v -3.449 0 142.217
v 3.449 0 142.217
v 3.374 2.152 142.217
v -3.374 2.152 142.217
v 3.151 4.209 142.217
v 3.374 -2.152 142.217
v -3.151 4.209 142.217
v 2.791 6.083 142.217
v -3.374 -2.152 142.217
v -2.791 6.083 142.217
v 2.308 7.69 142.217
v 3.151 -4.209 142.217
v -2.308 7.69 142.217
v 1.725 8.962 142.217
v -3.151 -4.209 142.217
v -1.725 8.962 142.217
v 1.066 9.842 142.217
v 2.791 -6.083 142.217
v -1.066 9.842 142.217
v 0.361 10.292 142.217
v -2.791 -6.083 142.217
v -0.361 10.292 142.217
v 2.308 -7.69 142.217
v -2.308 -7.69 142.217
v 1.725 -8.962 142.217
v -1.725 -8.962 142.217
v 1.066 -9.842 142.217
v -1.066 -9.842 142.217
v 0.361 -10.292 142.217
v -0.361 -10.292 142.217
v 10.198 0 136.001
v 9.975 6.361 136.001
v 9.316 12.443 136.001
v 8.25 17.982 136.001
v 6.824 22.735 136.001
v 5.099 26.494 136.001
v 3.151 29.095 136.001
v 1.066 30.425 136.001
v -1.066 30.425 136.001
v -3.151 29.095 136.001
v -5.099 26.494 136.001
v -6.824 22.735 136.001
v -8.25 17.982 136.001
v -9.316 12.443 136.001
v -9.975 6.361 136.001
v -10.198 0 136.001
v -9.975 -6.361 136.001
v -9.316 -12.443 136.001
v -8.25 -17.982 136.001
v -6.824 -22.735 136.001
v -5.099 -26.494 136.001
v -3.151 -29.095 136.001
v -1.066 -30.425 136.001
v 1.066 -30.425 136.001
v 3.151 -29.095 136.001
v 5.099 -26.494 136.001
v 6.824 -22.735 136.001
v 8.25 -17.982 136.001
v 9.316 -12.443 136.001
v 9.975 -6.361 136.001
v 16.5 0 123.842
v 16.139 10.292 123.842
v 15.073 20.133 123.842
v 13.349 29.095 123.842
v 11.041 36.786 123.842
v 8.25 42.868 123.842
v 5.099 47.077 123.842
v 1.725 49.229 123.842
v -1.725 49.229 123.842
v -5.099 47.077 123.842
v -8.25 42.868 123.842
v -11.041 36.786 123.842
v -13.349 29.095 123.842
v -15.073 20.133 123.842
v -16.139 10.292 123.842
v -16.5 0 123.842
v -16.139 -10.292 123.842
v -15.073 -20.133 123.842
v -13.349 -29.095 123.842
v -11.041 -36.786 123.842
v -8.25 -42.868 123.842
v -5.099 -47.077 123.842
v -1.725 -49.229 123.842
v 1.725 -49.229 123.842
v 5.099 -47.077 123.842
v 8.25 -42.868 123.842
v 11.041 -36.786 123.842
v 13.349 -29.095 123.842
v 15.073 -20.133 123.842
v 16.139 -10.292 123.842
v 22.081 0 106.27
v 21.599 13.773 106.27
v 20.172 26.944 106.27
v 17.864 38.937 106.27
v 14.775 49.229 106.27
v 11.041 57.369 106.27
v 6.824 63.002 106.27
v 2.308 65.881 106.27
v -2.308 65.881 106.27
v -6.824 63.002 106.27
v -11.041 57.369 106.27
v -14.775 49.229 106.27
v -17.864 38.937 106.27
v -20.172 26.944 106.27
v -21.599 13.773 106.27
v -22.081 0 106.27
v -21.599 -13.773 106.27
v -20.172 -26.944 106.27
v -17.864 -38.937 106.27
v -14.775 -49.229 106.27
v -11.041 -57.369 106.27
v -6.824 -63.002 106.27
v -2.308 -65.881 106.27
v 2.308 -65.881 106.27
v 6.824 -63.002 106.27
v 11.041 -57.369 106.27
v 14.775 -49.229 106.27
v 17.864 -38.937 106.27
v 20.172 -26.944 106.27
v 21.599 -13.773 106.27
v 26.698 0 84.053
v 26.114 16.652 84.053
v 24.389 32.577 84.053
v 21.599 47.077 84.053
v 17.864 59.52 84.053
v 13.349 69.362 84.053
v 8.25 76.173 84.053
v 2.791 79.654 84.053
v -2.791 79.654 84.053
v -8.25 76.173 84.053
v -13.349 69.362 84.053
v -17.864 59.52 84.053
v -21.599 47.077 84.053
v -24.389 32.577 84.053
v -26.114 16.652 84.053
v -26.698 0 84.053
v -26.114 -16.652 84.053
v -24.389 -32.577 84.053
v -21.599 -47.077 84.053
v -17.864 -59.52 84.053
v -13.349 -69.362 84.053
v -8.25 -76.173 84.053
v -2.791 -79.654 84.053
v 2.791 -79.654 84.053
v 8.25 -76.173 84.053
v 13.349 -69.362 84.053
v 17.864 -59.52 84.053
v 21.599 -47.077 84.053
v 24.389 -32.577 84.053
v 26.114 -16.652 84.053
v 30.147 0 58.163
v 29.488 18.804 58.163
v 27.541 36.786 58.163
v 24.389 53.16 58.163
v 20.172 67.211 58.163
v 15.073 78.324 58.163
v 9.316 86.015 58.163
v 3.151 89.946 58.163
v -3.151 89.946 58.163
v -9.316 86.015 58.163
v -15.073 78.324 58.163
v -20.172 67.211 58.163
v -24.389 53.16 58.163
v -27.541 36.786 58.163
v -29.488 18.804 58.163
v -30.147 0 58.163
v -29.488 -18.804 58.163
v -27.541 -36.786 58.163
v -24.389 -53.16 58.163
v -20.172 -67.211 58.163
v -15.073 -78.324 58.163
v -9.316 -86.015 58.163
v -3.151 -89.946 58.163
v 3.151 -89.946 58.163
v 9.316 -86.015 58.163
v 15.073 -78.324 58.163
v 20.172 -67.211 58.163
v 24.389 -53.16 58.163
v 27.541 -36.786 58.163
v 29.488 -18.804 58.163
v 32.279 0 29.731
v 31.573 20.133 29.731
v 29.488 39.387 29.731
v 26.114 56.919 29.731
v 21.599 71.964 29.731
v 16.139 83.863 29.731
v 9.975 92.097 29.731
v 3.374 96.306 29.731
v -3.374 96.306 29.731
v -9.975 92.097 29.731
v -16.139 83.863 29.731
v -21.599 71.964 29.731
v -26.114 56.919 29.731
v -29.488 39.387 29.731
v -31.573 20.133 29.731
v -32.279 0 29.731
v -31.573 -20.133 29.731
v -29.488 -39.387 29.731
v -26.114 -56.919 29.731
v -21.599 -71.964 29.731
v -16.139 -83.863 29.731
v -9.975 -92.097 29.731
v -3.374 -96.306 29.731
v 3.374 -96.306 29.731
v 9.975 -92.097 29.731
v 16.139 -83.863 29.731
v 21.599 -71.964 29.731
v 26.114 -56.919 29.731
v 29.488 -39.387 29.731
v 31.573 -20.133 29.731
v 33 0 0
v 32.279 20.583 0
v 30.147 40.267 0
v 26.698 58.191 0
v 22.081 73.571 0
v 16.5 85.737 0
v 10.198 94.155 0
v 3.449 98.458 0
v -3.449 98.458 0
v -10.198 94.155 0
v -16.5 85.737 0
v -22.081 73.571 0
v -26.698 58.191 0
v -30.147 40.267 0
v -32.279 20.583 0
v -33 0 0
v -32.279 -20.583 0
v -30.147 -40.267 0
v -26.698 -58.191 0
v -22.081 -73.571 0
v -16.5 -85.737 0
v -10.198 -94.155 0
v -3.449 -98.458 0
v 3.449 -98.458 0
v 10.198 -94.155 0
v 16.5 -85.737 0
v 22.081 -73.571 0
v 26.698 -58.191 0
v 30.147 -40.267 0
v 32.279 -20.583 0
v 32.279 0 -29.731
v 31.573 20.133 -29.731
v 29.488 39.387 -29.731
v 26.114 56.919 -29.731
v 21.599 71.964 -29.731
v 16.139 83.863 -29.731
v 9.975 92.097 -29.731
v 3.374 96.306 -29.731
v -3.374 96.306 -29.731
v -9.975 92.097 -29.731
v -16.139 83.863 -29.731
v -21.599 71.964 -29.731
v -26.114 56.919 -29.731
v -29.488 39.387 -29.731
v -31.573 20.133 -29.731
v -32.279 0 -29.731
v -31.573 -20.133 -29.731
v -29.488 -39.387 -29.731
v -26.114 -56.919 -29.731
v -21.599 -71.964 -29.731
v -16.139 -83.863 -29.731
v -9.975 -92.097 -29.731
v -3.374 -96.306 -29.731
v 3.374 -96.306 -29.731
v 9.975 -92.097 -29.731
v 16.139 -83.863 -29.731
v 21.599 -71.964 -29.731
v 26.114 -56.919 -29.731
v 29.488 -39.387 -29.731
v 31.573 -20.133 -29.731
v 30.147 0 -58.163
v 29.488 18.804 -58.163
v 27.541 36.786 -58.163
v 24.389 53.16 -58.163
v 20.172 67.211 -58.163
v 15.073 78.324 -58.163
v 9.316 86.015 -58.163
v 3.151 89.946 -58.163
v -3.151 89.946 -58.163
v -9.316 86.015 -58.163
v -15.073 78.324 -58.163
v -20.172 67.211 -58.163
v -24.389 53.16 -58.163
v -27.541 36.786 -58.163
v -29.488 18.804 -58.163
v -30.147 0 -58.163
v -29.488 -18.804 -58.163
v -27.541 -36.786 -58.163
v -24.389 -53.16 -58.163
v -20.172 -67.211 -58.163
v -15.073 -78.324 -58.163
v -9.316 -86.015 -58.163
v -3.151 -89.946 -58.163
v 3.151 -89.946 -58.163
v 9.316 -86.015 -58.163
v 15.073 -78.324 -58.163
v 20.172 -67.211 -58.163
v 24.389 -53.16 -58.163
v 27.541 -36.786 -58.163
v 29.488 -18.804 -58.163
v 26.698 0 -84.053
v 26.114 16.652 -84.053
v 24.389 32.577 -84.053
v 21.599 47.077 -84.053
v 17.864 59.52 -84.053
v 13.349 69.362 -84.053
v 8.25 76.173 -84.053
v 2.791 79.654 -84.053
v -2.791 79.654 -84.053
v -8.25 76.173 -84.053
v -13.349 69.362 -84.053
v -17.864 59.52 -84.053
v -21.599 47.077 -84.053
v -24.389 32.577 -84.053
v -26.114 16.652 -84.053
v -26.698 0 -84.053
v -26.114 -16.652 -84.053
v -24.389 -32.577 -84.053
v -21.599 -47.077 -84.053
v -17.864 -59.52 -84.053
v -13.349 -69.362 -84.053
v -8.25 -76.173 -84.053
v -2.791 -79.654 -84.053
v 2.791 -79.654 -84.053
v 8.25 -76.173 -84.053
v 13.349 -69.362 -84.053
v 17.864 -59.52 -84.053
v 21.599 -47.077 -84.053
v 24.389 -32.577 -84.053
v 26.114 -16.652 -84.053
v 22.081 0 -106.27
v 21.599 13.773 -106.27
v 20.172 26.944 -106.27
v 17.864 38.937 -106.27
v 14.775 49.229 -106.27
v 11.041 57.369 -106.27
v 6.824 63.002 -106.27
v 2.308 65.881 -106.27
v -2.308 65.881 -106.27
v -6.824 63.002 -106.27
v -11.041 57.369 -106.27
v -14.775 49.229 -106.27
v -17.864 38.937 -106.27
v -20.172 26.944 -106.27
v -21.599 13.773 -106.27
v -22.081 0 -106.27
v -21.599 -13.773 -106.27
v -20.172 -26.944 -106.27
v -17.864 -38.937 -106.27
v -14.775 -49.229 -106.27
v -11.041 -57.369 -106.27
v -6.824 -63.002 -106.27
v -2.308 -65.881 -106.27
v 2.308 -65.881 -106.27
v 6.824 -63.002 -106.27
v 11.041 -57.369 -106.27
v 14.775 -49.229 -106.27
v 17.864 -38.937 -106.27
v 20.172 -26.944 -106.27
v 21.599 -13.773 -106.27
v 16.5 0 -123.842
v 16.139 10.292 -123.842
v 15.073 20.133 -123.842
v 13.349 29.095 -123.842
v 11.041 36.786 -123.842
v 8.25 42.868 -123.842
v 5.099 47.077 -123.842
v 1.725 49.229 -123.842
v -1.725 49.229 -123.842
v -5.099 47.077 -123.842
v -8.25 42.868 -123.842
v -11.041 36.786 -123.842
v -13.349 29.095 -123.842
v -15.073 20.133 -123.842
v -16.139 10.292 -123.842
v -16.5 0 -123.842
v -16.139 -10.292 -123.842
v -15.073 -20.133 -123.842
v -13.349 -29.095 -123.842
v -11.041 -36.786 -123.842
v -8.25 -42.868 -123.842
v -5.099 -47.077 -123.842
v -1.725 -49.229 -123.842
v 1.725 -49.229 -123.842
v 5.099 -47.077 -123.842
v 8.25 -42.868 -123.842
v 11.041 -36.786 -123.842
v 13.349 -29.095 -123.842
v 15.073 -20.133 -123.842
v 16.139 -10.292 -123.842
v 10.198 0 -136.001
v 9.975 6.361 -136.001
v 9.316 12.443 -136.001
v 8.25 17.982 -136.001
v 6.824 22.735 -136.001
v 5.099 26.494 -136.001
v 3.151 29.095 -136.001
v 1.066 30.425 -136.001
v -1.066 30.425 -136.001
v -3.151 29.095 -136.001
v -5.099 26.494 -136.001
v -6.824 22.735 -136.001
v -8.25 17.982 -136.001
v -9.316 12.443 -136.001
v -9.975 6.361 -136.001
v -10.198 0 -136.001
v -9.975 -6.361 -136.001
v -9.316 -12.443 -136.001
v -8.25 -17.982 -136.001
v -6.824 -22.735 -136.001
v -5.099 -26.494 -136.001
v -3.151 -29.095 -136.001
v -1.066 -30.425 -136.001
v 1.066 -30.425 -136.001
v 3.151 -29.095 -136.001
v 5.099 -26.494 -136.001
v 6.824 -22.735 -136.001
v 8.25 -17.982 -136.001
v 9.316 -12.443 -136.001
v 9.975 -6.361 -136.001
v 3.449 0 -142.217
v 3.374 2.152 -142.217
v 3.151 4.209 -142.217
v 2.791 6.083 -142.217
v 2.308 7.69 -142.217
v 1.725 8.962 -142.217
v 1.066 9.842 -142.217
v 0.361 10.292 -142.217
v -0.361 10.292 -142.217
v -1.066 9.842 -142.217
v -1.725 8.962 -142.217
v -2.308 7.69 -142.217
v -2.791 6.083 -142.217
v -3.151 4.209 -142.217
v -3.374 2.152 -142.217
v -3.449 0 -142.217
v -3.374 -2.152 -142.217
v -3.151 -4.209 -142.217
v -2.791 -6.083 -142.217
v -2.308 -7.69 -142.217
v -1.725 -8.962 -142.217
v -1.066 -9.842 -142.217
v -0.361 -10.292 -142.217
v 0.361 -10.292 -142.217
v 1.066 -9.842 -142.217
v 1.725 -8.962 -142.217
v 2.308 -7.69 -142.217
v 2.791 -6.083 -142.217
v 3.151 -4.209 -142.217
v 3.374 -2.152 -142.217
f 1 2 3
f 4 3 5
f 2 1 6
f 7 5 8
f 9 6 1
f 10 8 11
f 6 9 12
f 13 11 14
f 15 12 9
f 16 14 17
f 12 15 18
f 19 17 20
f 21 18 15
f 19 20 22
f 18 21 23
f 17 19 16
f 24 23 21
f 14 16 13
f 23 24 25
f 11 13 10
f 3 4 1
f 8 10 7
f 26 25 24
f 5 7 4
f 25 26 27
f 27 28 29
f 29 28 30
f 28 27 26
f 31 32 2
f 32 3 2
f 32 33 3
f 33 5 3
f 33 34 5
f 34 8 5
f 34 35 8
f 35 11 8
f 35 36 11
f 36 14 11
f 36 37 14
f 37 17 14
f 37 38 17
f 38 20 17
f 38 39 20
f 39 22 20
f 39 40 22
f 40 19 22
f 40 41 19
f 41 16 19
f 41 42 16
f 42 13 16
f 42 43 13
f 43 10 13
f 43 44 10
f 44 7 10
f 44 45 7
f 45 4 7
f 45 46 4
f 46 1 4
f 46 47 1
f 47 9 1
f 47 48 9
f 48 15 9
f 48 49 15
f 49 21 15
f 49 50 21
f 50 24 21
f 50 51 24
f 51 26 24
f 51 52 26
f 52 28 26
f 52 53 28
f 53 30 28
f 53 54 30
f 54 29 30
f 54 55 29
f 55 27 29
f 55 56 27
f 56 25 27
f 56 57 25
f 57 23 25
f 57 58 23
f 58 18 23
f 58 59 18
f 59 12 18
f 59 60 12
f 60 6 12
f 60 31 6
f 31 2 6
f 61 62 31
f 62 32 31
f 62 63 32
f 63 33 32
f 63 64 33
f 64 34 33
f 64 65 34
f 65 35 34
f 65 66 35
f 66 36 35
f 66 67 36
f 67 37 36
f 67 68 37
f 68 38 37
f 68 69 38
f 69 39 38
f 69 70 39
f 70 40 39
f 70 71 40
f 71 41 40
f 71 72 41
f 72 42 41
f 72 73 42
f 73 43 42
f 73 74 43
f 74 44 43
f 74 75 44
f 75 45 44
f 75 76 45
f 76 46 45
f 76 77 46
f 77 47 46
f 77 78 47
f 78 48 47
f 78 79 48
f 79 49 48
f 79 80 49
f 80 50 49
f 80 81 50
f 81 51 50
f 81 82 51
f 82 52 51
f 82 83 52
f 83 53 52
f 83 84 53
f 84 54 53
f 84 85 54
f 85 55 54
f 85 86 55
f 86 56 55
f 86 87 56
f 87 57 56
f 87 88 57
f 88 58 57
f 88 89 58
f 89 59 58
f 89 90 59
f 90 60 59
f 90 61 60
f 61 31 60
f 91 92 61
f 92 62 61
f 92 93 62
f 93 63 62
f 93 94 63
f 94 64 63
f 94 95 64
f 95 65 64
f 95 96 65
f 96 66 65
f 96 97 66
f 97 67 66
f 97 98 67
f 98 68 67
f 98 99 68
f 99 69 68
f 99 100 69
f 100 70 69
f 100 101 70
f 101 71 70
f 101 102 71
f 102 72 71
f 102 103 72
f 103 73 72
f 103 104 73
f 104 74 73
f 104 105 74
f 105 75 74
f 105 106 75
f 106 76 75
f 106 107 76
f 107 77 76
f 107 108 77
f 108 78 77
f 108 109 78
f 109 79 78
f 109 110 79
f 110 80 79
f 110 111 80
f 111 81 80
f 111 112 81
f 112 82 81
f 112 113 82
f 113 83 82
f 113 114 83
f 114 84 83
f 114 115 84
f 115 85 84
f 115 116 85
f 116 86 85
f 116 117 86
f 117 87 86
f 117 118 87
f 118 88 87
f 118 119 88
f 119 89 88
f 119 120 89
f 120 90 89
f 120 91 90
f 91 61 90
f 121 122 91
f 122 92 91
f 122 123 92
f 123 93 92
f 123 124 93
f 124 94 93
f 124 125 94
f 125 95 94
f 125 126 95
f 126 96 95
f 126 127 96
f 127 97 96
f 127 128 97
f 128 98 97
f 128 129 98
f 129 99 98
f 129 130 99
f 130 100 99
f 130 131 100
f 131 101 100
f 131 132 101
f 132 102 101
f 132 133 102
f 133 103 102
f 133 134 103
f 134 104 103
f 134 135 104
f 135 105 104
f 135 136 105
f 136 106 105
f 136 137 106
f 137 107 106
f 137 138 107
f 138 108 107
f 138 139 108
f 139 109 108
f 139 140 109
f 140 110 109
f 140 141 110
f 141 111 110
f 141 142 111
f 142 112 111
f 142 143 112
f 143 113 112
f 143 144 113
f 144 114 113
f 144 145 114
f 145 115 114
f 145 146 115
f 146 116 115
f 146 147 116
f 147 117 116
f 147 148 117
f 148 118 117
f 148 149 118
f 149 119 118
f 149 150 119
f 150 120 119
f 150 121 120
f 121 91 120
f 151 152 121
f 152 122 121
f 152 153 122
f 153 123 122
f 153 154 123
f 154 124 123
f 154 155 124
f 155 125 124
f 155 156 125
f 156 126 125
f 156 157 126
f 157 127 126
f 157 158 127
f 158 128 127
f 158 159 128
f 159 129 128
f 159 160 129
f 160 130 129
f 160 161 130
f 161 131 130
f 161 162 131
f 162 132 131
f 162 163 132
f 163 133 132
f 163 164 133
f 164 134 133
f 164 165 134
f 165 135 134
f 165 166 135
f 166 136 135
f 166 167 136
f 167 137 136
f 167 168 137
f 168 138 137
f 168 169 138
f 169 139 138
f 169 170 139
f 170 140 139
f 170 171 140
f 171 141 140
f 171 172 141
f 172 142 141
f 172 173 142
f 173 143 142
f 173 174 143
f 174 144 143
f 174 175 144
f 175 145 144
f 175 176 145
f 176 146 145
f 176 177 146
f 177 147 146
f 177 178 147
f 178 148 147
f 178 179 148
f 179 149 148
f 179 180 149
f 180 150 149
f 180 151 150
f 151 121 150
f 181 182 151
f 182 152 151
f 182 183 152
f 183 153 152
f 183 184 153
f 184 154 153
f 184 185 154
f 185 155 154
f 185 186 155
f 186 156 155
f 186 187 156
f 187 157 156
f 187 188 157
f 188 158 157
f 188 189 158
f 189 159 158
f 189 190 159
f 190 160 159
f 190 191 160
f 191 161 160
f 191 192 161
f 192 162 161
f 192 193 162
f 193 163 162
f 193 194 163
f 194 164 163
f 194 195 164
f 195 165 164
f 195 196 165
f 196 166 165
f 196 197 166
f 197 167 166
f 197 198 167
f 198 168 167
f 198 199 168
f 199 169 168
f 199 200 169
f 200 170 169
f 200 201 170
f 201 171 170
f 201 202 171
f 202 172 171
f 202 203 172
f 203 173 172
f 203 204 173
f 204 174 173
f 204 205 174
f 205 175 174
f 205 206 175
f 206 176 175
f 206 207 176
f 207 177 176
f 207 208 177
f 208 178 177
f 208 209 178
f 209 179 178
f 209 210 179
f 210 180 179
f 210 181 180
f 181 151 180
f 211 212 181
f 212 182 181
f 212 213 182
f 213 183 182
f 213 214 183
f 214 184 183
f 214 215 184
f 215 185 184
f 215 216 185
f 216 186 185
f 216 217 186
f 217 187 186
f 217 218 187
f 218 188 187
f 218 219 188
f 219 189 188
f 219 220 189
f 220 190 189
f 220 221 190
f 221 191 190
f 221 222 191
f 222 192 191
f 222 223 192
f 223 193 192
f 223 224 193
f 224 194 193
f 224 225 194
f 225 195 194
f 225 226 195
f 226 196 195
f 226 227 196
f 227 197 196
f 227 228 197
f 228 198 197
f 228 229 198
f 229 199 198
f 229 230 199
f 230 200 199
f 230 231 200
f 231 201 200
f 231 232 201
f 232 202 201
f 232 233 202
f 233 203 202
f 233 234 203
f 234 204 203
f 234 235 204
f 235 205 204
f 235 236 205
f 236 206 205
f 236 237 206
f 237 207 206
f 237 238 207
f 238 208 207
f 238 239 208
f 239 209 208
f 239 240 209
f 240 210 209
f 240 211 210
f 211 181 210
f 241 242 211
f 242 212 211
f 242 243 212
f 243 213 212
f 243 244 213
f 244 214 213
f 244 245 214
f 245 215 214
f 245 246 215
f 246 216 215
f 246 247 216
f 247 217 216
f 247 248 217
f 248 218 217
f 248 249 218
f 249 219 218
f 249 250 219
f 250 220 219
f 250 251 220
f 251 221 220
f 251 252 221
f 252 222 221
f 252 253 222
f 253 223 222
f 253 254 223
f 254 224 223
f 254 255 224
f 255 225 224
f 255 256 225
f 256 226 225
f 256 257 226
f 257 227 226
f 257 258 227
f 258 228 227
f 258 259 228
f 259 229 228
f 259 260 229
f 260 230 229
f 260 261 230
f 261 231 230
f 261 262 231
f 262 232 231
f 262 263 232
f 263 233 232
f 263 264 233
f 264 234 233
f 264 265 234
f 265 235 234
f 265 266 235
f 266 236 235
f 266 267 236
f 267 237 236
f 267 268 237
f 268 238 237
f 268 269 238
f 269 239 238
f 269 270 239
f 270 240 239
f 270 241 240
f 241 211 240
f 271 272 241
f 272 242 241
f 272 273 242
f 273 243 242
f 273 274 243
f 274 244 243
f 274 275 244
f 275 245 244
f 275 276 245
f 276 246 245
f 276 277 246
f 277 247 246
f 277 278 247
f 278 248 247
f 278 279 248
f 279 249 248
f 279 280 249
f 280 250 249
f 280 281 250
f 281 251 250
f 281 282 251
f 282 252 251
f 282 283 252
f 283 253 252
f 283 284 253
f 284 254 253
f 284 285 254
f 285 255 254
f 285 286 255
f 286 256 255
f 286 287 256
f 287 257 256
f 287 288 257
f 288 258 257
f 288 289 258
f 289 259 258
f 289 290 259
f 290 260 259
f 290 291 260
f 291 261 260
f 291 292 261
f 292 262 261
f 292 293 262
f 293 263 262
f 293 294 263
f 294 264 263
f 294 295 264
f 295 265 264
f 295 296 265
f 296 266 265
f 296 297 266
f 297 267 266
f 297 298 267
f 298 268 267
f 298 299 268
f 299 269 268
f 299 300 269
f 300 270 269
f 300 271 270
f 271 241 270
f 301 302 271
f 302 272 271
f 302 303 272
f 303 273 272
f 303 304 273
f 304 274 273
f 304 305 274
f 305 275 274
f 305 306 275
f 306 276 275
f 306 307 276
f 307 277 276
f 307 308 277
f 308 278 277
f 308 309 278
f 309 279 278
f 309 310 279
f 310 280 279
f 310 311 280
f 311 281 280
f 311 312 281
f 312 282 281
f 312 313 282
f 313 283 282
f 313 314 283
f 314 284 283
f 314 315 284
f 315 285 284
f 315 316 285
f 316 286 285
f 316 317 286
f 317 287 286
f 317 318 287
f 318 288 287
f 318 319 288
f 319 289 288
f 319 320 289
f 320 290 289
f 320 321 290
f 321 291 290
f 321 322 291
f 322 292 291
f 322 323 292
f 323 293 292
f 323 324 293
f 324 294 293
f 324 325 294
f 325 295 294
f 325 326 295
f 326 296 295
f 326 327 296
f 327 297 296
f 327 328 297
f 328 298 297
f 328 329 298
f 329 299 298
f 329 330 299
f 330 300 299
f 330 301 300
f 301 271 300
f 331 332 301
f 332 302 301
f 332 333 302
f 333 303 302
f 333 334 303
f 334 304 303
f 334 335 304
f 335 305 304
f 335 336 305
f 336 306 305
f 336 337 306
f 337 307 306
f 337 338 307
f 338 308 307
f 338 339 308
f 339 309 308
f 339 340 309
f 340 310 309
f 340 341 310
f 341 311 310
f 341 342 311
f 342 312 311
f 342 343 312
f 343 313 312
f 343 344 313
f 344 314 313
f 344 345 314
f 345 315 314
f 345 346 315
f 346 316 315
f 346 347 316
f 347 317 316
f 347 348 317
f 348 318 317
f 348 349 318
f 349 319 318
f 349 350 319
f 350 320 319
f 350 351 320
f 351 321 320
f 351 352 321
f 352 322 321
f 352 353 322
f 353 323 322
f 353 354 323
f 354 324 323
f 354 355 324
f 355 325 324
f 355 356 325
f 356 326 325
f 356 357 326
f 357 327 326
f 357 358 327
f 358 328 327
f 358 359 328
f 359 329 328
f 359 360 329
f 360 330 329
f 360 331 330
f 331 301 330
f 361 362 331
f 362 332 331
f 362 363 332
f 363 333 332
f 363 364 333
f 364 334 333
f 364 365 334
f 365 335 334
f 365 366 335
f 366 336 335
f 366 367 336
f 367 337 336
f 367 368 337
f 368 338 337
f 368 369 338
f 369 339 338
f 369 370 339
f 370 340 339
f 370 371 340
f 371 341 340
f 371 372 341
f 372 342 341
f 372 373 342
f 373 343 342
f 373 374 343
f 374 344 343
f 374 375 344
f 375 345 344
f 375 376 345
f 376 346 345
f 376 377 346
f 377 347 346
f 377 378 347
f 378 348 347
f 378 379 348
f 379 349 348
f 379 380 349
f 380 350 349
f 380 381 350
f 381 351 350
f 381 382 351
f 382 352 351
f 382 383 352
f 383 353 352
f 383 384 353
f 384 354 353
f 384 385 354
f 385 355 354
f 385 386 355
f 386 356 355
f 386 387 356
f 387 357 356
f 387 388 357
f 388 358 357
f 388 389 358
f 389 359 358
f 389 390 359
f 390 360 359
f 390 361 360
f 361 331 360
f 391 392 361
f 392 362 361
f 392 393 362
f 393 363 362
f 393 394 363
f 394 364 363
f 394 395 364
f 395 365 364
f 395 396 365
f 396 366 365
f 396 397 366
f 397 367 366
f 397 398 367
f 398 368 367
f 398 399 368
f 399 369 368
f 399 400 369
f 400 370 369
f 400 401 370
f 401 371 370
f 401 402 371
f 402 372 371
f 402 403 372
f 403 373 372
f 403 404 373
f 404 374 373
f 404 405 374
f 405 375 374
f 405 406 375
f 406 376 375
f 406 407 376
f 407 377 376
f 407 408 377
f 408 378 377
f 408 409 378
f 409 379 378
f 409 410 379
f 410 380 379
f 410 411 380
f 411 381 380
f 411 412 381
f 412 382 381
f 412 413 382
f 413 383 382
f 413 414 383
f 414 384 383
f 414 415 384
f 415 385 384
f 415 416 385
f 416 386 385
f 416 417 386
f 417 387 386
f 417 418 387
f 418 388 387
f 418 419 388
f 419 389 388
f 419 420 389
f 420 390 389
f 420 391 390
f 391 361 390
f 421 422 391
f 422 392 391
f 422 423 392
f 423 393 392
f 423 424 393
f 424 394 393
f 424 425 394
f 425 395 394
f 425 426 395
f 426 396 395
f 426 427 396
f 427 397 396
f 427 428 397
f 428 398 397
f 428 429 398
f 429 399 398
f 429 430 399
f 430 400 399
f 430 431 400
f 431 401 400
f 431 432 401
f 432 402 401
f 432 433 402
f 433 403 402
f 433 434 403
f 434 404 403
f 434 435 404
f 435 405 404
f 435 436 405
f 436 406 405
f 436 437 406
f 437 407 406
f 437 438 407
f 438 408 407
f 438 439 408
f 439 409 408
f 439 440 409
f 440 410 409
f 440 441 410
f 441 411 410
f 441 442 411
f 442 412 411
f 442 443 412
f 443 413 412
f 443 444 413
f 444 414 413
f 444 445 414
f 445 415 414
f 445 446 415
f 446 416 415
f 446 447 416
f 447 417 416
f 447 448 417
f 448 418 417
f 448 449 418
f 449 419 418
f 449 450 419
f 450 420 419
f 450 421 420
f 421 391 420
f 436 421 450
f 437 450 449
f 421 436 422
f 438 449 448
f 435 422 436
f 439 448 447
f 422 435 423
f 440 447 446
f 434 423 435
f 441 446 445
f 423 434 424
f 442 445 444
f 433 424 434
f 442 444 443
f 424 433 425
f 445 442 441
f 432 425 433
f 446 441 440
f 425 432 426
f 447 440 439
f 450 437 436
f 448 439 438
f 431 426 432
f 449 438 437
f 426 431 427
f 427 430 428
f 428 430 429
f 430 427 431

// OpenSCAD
// Generated by SolidPython 1.0.1 on 2020-07-29 00:46:45


scale(v = [3, 9, 13]) {
	sphere(r = 11);
}
/***********************************************
*********      SolidPython code:      **********
************************************************
 
# import packages: SolidPython
from solid import *
from solid.utils import *
from itertools import chain, combinations, permutations


class Resize:

    def __init__(self, scad_file):
        self.scad_file = scad_file
        #self.scad_file = import_scad(scad_file)
        # cone/cylinder param:
        self.r1 = 0
        self.r2 = 0
        self.h = 0
        # rectangular prism param:
        self.w = 0
        self.l = 0
        # ellipse param:
        self.r = 0

    # import OpenScad code (file name corresponds to shape)


    # classify shape + parameters
    def assign(self, param1, param2, param3):
        if self.scad_file == 'cone.scad':
            self.r1 = param1
            self.r2 = param2
            self.h = param3
        elif self.scad_file == 'cylinder.scad':
            self.r1 = param1
            self.r2 = param2
            self.h = param3
        elif self.scad_file == 'rectangularPrism.scad':
            self.h = param1
            self.l = param2
            self.w = param3
        else:
            self.r = param1
            self.h = param2

    # resize parameters
    def iterate(self):
        x = range(3, 20, 2)
        i = 1
        if self.scad_file == 'cone.scad':
            tempList = list(permutations(x, 2))
            for temp in tempList:
                param1 = temp[0]
                param2 = temp[1]
                filepath = 'produced_scad_files/' + 'cone' + str(param1) + '_' + str(param2) + '_' + '.scad'
                scad_render_to_file(cylinder(h=param1, r1=param2, r2=0), filepath)

        elif self.scad_file == 'cylinder.scad':
            tempList = list(permutations(x, 3))
            for temp in tempList:
                param1 = temp[0]
                param2 = temp[1]
                filepath = 'produced_scad_files/' + 'cylinder' + str(param1) + '_' + str(param2) + '_' + '.scad'
                scad_render_to_file(cylinder(h=param1, r1=param2, r2=param2), filepath)

        elif self.scad_file == 'rectangularPrism.scad':
            tempList = list(permutations(x, 3))
            for temp in tempList:
                param1 = temp[0]
                param2 = temp[1]
                param3 = temp[2]
                filepath = 'produced_scad_files/' + 'rectangularPrism' + str(param1) + '_' + str(param2) + '_' + str(
                    param3) + '.scad'
                scad_render_to_file(cube(size=(param1, param2, param3)), filepath)

        elif self.scad_file == 'ellipse.scad':
            tempList = list(permutations(x, 4))
            for temp in tempList:
                param1 = temp[0]
                param2 = temp[1]
                param3 = temp[2]
                param4 = temp[3]
                filepath = 'produced_scad_files/' + 'ellipse' + str(param1) + '_' + str(param2) + '_' + str(param3) + '_' + str(param4) + '.scad'
                scad_render_to_file(scale([param1, param2, param3])(sphere(r=param4)), filepath)

    def render_to_scadfile(self):
        scad_render_to_file(scad, 'example.scad') 
 
************************************************/
